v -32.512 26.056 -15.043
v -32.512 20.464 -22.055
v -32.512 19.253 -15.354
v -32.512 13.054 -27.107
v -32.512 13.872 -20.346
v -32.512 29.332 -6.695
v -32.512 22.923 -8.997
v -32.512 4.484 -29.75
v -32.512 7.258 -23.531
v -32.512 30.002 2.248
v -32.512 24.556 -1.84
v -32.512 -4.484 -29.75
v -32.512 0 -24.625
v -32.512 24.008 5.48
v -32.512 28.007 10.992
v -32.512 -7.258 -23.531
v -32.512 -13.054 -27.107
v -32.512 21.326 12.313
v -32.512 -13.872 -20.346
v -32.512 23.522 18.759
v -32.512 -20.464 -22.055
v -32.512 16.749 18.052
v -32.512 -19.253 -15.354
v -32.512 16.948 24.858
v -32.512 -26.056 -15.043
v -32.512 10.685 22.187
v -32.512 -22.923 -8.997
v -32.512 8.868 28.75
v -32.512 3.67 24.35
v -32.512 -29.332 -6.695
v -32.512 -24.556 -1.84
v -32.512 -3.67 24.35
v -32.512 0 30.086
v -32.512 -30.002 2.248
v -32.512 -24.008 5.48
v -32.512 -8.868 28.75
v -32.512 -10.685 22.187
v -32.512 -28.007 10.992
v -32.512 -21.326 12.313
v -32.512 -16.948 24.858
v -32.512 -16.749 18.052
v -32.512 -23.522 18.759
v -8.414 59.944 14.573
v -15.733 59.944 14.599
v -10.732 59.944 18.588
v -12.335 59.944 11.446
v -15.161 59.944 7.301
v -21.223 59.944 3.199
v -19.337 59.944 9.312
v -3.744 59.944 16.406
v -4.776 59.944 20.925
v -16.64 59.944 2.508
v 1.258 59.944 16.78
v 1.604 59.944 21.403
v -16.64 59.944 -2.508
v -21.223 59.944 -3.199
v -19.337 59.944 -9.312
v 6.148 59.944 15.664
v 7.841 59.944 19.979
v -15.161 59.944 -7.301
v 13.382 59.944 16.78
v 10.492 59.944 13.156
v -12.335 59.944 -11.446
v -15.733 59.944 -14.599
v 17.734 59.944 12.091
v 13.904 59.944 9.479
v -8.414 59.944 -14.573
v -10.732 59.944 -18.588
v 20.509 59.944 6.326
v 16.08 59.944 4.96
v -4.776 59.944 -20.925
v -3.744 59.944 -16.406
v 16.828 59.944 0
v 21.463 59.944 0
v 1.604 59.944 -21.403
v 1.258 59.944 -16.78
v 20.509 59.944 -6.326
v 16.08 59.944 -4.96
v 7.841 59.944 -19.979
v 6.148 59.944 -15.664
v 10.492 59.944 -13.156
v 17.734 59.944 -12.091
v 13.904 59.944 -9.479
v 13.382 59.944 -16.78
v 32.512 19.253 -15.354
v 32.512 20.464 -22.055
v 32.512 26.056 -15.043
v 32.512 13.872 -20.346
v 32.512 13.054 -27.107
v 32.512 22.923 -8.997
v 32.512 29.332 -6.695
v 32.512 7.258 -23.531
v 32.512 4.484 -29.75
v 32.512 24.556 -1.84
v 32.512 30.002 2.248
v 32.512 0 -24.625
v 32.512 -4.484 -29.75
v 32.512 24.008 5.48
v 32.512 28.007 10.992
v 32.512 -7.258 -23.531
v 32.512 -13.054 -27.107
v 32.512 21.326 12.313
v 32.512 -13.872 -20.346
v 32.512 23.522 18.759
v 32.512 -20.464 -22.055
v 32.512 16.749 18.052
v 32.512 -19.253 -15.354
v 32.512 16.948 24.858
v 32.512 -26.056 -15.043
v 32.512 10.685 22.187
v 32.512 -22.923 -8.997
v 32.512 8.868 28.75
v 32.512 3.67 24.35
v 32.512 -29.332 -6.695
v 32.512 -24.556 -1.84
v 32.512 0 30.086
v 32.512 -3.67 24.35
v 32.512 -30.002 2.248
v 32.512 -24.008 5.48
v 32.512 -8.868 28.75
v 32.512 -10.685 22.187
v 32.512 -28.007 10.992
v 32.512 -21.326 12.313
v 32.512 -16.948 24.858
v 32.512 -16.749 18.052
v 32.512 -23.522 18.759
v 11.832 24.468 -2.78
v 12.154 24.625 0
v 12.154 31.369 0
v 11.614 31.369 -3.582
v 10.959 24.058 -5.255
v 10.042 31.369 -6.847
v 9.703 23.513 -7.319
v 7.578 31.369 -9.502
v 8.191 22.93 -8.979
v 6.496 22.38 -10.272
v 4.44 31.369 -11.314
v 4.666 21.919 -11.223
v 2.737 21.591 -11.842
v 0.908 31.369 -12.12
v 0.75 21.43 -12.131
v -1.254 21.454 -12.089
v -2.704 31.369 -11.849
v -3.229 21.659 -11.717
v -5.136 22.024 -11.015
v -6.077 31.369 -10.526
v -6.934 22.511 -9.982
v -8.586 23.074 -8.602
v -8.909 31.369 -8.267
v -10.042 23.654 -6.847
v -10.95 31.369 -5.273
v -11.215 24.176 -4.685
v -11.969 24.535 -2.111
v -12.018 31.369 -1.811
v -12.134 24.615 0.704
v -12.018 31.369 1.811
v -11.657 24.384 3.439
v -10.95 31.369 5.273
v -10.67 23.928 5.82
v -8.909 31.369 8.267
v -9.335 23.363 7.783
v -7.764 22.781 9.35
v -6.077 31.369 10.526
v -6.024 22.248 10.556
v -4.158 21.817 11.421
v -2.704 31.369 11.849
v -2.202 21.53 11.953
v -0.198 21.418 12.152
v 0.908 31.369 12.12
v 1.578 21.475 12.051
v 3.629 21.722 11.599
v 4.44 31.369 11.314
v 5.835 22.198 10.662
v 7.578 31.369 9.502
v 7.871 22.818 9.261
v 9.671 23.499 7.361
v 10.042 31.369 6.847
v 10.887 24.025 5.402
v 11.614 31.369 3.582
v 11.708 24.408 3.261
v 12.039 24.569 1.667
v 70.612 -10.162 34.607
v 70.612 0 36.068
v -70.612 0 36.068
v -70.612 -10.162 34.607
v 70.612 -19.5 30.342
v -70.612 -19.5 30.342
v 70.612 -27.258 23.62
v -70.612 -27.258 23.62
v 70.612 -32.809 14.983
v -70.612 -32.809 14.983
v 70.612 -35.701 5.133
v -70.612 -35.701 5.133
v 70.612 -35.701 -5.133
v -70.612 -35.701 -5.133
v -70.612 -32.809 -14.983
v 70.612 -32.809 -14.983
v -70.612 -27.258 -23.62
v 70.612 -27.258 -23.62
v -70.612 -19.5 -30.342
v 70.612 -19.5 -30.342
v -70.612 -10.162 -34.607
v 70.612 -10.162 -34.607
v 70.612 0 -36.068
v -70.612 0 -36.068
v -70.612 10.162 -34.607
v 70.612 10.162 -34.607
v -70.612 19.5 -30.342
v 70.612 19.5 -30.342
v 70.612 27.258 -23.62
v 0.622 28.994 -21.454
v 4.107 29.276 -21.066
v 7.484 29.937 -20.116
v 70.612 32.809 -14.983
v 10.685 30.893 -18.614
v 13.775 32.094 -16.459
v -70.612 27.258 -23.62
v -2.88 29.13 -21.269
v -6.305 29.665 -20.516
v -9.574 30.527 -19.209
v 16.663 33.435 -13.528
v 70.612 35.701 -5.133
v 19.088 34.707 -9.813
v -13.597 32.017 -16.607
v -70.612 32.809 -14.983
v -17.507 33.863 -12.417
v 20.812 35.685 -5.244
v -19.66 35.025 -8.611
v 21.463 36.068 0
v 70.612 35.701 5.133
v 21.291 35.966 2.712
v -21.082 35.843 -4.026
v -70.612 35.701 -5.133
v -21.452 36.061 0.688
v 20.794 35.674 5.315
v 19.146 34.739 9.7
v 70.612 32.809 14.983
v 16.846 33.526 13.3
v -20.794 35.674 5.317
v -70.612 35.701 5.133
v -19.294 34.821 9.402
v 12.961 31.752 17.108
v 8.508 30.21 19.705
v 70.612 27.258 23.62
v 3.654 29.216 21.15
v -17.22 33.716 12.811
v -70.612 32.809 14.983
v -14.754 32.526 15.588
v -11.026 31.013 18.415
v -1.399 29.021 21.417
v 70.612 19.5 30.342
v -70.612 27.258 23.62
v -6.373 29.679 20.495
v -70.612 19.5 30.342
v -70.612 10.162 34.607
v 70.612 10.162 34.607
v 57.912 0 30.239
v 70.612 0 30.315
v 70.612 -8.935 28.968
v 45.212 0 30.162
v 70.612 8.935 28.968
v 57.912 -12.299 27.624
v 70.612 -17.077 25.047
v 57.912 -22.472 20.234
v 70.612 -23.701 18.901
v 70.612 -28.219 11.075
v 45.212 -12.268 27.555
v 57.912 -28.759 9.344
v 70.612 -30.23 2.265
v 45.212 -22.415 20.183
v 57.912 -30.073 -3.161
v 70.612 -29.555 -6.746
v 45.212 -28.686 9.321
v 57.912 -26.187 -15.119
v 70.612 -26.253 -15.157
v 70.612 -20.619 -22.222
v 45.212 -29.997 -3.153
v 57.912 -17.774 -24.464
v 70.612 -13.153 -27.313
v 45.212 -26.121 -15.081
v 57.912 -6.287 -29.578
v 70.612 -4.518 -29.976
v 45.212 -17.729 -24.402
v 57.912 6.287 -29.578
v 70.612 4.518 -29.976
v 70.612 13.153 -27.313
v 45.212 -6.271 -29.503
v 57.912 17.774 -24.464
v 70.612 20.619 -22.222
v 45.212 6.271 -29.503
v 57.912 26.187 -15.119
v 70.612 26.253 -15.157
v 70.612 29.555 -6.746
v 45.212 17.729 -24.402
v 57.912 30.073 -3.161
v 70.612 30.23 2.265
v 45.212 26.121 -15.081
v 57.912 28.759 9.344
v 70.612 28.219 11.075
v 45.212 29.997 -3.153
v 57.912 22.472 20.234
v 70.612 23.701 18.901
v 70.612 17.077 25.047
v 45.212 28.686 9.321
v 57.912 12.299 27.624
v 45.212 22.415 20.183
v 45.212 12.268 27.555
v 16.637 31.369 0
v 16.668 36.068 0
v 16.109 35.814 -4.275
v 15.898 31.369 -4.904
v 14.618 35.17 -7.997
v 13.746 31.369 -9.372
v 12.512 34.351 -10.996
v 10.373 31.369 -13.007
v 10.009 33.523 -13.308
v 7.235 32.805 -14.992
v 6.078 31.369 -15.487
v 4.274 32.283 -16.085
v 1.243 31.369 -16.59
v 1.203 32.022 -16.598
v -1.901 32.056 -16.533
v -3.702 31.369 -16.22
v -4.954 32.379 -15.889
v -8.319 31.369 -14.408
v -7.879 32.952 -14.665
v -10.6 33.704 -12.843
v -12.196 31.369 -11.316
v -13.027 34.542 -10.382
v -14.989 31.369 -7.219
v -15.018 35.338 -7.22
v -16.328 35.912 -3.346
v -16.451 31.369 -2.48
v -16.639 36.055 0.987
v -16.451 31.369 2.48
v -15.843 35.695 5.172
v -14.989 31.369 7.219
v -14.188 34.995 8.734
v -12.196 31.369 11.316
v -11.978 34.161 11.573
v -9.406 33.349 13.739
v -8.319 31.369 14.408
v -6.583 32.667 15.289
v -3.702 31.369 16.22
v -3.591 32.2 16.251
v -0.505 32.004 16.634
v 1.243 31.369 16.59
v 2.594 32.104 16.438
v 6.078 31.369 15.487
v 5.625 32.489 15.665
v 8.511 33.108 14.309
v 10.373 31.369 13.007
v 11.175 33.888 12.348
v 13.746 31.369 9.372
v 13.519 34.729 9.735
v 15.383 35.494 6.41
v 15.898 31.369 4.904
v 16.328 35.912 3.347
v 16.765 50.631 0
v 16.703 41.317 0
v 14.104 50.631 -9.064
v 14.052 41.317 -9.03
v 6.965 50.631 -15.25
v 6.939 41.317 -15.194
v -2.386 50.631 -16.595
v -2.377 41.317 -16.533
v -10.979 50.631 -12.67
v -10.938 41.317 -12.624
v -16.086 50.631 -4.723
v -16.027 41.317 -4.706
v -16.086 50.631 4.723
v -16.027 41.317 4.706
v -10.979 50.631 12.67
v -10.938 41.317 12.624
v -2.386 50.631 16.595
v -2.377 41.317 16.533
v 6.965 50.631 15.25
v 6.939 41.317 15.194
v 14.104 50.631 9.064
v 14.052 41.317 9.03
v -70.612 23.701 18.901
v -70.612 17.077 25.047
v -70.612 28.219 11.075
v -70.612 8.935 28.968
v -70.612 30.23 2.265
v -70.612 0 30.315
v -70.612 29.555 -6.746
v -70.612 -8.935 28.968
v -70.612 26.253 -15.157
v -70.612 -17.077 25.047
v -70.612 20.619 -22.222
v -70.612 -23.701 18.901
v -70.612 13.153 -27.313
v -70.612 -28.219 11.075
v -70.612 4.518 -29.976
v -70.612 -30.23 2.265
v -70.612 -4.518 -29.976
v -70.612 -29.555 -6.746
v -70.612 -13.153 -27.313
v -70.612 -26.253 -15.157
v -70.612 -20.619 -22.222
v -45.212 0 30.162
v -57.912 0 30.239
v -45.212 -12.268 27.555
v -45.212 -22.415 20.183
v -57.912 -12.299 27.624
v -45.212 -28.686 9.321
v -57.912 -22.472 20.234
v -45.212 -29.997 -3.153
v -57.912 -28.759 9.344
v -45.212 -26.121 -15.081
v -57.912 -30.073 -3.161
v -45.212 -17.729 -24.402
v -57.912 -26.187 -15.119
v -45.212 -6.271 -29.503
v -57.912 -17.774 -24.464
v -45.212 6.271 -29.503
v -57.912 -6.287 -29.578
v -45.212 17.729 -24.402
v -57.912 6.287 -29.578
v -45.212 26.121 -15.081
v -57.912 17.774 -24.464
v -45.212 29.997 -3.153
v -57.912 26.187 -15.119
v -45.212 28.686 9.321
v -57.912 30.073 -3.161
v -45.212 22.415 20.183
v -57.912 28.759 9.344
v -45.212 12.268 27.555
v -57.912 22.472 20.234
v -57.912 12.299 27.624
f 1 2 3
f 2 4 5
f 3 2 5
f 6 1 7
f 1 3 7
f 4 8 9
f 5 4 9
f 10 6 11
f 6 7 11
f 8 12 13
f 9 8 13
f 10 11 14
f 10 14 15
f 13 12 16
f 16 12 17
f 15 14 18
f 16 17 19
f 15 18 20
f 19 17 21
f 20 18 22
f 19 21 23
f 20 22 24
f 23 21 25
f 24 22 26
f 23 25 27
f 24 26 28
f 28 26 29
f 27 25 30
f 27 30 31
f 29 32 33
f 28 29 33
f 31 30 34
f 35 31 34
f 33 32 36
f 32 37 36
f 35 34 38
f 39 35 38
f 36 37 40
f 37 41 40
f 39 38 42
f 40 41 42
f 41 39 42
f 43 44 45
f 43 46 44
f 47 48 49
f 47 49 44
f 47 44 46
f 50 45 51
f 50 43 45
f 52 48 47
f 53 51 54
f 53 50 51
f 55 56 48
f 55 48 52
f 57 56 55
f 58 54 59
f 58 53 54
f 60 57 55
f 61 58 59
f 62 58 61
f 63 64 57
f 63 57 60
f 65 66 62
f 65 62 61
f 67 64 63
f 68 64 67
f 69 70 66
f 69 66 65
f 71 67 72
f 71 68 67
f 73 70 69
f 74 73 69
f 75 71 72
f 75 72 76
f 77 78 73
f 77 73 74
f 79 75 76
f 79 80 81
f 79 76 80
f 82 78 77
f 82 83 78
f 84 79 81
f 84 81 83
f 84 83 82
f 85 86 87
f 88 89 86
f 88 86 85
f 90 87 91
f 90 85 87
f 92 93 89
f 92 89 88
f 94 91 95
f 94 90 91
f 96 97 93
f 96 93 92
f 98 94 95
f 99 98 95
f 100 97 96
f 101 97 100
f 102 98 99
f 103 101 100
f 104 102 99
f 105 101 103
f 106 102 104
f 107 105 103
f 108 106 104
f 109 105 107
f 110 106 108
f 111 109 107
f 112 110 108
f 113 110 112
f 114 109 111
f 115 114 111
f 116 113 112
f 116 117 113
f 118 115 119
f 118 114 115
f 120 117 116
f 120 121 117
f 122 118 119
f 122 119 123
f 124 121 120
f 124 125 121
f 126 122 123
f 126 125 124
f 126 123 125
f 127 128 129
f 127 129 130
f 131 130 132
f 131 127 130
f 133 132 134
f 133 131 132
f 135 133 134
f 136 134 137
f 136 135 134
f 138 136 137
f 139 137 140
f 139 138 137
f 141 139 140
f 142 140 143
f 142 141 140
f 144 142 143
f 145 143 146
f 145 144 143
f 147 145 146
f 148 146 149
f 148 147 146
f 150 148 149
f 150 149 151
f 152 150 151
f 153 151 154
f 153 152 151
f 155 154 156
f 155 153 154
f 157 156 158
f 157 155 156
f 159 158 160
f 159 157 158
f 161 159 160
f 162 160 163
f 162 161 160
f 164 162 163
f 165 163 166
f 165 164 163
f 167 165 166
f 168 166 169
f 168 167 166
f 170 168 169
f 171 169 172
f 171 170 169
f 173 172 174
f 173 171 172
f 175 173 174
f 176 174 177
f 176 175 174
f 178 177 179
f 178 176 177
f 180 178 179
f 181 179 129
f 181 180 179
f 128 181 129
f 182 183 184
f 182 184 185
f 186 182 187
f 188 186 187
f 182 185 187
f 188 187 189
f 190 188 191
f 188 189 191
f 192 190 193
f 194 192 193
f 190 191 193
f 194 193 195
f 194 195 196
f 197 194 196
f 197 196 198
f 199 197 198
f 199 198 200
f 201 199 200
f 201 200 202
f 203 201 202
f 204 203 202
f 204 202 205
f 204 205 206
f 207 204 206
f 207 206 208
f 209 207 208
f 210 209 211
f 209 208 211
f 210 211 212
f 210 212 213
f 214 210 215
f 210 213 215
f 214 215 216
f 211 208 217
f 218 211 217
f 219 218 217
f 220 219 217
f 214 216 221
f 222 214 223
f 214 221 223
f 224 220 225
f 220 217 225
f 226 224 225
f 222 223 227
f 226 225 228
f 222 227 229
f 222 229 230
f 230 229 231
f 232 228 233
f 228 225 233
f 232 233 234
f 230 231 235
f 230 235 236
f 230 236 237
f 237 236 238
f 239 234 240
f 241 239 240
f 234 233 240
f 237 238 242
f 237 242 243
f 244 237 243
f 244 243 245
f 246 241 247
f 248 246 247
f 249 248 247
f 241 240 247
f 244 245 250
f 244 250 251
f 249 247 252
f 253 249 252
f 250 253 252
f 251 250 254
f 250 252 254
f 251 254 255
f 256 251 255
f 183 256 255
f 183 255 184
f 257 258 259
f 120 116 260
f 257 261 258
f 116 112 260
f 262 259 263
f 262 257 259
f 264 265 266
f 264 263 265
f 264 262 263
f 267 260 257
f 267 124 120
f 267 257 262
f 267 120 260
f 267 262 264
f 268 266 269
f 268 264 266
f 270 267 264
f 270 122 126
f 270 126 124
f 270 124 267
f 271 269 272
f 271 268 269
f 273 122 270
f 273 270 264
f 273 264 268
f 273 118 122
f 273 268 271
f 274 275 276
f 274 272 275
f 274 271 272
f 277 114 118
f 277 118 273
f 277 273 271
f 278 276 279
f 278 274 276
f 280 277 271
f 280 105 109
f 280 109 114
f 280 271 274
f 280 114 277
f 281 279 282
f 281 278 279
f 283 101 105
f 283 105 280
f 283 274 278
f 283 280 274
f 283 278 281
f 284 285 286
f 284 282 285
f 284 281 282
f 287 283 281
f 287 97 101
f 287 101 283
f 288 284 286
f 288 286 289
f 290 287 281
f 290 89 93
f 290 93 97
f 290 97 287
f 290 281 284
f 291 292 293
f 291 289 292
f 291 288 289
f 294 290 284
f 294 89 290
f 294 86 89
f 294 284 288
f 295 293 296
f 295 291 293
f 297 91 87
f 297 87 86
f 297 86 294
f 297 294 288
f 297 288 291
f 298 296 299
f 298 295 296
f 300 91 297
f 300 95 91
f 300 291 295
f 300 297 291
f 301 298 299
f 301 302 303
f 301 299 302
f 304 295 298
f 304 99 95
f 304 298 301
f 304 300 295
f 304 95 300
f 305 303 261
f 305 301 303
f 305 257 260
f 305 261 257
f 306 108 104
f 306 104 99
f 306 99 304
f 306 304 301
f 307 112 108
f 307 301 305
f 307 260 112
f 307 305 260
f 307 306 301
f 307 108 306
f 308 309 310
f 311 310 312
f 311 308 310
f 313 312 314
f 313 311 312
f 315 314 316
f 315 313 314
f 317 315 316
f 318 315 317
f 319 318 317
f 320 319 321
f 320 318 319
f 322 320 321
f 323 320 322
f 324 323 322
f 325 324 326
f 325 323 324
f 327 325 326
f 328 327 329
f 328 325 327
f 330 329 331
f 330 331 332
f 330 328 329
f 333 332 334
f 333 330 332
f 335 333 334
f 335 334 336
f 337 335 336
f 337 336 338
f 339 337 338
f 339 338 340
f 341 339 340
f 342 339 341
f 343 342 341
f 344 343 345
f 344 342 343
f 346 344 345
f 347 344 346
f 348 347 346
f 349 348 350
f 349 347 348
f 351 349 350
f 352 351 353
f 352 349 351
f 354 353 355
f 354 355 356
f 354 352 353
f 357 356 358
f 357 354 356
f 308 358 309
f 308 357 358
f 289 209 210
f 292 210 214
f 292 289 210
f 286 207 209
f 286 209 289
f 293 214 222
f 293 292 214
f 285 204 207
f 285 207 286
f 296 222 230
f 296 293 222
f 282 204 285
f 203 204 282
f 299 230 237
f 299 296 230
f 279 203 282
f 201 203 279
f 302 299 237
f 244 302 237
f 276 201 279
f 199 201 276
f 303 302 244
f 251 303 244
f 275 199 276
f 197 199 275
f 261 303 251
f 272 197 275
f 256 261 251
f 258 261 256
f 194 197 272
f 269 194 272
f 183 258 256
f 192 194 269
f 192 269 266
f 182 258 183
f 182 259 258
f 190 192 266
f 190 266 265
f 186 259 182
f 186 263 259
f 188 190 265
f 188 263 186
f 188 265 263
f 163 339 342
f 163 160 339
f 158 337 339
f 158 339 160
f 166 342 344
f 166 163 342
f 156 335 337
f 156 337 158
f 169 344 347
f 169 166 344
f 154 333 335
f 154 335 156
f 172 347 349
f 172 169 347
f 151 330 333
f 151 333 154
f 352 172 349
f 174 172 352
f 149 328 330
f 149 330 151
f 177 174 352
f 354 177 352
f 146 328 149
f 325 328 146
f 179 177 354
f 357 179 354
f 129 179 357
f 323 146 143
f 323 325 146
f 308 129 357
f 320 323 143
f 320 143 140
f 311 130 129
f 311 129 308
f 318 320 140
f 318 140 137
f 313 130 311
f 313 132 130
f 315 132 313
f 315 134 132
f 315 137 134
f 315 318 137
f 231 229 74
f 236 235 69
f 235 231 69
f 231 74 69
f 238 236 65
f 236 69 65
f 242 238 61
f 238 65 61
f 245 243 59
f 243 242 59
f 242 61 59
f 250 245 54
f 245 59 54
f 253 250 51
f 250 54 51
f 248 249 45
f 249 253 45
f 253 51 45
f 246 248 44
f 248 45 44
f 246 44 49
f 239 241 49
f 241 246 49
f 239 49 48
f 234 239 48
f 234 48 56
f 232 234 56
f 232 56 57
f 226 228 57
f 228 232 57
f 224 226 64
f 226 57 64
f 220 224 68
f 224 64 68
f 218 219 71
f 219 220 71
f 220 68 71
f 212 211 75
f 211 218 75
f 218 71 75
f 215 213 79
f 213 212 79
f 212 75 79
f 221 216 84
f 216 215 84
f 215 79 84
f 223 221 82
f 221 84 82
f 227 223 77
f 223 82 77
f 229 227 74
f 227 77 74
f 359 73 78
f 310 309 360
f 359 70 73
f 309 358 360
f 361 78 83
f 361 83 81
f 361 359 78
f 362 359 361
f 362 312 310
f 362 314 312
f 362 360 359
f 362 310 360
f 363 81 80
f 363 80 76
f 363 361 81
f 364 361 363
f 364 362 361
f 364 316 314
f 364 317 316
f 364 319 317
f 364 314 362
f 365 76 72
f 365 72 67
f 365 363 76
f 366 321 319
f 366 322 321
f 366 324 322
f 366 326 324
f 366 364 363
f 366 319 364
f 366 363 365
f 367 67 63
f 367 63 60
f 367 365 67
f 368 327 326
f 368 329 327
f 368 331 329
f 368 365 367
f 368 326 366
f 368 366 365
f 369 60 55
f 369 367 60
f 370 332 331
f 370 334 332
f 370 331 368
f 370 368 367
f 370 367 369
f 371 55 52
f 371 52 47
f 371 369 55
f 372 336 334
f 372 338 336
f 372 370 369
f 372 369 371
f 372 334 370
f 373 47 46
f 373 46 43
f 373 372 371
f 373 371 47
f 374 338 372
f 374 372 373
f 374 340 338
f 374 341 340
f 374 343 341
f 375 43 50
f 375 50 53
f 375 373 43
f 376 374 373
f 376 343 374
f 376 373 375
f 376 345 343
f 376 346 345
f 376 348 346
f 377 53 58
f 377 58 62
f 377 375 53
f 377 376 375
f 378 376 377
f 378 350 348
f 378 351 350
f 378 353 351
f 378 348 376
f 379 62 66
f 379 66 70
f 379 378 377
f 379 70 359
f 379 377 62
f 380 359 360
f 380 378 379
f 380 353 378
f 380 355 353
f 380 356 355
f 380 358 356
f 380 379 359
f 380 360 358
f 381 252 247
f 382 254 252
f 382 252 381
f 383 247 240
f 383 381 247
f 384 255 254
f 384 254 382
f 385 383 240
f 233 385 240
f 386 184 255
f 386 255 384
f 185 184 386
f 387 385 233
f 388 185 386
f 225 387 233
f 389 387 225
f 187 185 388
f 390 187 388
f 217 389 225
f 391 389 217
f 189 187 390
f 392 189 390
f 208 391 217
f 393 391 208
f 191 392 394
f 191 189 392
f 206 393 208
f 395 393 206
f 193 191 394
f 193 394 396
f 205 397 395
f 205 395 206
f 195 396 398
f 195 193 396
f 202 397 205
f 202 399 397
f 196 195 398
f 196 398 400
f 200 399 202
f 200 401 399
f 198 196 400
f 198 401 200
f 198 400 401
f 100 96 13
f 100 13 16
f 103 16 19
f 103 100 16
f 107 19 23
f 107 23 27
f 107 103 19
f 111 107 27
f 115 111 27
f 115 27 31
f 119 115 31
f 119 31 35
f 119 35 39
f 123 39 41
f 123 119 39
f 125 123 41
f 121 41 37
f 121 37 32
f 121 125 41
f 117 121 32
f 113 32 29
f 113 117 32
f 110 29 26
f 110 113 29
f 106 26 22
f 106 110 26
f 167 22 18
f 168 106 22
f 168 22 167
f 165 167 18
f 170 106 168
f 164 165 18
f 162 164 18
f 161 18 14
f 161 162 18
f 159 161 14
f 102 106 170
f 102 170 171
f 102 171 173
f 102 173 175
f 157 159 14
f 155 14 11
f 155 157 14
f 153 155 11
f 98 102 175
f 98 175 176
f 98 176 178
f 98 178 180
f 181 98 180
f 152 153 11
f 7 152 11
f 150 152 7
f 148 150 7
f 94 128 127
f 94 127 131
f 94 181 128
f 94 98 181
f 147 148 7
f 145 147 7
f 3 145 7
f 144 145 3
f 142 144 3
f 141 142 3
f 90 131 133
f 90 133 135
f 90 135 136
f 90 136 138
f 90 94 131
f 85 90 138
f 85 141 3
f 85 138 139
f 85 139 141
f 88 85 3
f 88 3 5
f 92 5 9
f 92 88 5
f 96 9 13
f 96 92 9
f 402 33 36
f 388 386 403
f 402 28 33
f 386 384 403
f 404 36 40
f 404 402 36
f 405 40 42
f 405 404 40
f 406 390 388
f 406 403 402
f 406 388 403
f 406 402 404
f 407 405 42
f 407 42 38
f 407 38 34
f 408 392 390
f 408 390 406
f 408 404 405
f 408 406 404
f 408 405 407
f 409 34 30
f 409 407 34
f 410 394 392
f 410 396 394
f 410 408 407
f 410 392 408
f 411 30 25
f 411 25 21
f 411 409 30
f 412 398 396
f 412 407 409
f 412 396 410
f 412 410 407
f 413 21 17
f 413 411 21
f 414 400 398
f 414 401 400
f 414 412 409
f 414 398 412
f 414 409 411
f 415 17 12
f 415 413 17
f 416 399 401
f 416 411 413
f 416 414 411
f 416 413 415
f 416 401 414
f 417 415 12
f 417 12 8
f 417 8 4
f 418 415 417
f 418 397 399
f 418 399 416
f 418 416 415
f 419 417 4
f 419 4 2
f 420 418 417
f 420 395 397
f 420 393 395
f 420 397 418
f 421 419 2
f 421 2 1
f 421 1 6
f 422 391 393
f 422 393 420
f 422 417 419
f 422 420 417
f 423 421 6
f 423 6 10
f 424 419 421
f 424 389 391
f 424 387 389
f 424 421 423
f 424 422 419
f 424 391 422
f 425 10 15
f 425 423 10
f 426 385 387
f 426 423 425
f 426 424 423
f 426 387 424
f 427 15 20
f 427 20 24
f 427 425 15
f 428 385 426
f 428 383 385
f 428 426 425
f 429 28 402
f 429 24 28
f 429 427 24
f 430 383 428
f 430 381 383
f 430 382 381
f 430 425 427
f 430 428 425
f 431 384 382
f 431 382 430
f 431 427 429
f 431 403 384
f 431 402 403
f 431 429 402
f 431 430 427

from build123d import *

# Parameters (mm, degrees)
SKETCH4_R           = 36.068
BOSS_EXTRUDE1_DEPTH = 65.024
SKETCH5_R           = 21.463
BOSS_EXTRUDE2_DEPTH = 31.369


with BuildPart() as part:
    # Sketch1 → Revolve1 (revolve)
    with BuildSketch(Plane.XY, mode=Mode.PRIVATE) as revolve1_sk:
        Polygon((-70.612, -36.068), (-32.512, -36.068), (-32.512, -30.0863), (-70.612, -30.3149), align=None)
        Polygon((70.612, -30.3149), (32.512, -30.0863), (32.512, -36.068), (70.612, -36.068), align=None)
    revolve(revolve1_sk.sketch.rotate(Axis((-70.612, 0, 0), (1, 0, 0)), 270), axis=Axis((-70.612, 0, 0), (1, 0, 0)))



with BuildPart() as body_2:
    # Sketch2 → Revolve2 (revolve)
    with BuildSketch(Plane.XY):
        Polygon((16.8275, 59.944), (16.637, 31.369), (21.463, 31.369), (21.463, 59.944), align=None)
    revolve(axis=Axis((0, 0, 0), (0, 1, 0)))


with BuildPart() as part_1:
    add(part.part)

    add(body_2.part)  # Boss-Extrude1 merges body 2
    # Sketch4 → Boss-Extrude1 (add)
    with BuildSketch(Plane(origin=(-32.512, 0, 0), x_dir=(0, 0, -1), z_dir=(1, 0, 0))):
        with Locations(Location((0, 0, 0), (0, 0, 180))):
            Circle(SKETCH4_R)
    extrude(amount=BOSS_EXTRUDE1_DEPTH)

    # Sketch5 → Boss-Extrude2 (add)
    with BuildSketch(Plane.XZ.offset(-31.369)):
        Circle(SKETCH5_R)
    extrude(amount=BOSS_EXTRUDE2_DEPTH)

    # Sketch6 → Cut-Revolve1 (revolve, cut)
    with BuildSketch(Plane.XY, mode=Mode.PRIVATE) as cut_revolve1_sk:
        Polygon((-70.612, -30.3149), (-32.512, -30.0863), (-32.512, -24.6253), (32.512, -24.6253), (32.512, -30.0863), (70.612, -30.3149), (70.612, 0), (-70.612, 0), align=None)
    revolve(cut_revolve1_sk.sketch.rotate(Axis((70.612, 0, 0), (-1, 0, 0)), 270), axis=Axis((70.612, 0, 0), (-1, 0, 0)), mode=Mode.SUBTRACT)

    # Sketch7 → Cut-Revolve2 (revolve, cut)
    with BuildSketch(Plane.XY):
        Polygon((16.8275, 59.944), (16.637, 31.369), (12.1539, 31.369), (12.1539, 0), (0, 0), (0, 59.944), align=None)
    revolve(axis=Axis((0, 0, 0), (0, 1, 0)), mode=Mode.SUBTRACT)


solid = part_1.part
